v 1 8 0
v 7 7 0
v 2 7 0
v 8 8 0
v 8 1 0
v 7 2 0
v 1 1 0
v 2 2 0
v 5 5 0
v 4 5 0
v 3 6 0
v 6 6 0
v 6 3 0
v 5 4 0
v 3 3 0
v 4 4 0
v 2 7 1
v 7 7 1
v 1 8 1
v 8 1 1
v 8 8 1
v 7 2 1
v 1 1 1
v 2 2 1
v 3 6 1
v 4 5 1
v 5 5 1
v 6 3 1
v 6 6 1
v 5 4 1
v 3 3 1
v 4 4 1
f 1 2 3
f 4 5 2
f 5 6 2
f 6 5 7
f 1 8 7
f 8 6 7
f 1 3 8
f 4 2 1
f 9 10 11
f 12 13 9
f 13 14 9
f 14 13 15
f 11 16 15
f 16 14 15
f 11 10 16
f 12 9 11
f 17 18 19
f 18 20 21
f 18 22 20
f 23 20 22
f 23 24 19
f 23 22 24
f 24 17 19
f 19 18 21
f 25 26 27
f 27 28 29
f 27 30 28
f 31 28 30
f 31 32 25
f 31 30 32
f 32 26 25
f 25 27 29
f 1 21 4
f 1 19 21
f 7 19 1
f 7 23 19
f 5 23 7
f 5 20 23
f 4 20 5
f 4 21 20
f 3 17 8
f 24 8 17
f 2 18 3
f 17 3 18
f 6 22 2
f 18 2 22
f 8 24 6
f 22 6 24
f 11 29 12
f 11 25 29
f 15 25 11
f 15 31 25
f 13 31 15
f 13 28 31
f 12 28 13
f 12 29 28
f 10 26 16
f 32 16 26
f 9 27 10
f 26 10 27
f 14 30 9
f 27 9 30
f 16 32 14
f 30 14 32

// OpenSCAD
linear_extrude(1) {
    translate([1,1]) {
        difference() {
            square([7,7]);
            translate([1,1]) {
                square([5,5]);
            }
        }
    }

    translate([3,3]) {
        difference() {
            square([3,3]);
            translate([1,1]) {
                square([1,1]);
            }
        }
    }
}
